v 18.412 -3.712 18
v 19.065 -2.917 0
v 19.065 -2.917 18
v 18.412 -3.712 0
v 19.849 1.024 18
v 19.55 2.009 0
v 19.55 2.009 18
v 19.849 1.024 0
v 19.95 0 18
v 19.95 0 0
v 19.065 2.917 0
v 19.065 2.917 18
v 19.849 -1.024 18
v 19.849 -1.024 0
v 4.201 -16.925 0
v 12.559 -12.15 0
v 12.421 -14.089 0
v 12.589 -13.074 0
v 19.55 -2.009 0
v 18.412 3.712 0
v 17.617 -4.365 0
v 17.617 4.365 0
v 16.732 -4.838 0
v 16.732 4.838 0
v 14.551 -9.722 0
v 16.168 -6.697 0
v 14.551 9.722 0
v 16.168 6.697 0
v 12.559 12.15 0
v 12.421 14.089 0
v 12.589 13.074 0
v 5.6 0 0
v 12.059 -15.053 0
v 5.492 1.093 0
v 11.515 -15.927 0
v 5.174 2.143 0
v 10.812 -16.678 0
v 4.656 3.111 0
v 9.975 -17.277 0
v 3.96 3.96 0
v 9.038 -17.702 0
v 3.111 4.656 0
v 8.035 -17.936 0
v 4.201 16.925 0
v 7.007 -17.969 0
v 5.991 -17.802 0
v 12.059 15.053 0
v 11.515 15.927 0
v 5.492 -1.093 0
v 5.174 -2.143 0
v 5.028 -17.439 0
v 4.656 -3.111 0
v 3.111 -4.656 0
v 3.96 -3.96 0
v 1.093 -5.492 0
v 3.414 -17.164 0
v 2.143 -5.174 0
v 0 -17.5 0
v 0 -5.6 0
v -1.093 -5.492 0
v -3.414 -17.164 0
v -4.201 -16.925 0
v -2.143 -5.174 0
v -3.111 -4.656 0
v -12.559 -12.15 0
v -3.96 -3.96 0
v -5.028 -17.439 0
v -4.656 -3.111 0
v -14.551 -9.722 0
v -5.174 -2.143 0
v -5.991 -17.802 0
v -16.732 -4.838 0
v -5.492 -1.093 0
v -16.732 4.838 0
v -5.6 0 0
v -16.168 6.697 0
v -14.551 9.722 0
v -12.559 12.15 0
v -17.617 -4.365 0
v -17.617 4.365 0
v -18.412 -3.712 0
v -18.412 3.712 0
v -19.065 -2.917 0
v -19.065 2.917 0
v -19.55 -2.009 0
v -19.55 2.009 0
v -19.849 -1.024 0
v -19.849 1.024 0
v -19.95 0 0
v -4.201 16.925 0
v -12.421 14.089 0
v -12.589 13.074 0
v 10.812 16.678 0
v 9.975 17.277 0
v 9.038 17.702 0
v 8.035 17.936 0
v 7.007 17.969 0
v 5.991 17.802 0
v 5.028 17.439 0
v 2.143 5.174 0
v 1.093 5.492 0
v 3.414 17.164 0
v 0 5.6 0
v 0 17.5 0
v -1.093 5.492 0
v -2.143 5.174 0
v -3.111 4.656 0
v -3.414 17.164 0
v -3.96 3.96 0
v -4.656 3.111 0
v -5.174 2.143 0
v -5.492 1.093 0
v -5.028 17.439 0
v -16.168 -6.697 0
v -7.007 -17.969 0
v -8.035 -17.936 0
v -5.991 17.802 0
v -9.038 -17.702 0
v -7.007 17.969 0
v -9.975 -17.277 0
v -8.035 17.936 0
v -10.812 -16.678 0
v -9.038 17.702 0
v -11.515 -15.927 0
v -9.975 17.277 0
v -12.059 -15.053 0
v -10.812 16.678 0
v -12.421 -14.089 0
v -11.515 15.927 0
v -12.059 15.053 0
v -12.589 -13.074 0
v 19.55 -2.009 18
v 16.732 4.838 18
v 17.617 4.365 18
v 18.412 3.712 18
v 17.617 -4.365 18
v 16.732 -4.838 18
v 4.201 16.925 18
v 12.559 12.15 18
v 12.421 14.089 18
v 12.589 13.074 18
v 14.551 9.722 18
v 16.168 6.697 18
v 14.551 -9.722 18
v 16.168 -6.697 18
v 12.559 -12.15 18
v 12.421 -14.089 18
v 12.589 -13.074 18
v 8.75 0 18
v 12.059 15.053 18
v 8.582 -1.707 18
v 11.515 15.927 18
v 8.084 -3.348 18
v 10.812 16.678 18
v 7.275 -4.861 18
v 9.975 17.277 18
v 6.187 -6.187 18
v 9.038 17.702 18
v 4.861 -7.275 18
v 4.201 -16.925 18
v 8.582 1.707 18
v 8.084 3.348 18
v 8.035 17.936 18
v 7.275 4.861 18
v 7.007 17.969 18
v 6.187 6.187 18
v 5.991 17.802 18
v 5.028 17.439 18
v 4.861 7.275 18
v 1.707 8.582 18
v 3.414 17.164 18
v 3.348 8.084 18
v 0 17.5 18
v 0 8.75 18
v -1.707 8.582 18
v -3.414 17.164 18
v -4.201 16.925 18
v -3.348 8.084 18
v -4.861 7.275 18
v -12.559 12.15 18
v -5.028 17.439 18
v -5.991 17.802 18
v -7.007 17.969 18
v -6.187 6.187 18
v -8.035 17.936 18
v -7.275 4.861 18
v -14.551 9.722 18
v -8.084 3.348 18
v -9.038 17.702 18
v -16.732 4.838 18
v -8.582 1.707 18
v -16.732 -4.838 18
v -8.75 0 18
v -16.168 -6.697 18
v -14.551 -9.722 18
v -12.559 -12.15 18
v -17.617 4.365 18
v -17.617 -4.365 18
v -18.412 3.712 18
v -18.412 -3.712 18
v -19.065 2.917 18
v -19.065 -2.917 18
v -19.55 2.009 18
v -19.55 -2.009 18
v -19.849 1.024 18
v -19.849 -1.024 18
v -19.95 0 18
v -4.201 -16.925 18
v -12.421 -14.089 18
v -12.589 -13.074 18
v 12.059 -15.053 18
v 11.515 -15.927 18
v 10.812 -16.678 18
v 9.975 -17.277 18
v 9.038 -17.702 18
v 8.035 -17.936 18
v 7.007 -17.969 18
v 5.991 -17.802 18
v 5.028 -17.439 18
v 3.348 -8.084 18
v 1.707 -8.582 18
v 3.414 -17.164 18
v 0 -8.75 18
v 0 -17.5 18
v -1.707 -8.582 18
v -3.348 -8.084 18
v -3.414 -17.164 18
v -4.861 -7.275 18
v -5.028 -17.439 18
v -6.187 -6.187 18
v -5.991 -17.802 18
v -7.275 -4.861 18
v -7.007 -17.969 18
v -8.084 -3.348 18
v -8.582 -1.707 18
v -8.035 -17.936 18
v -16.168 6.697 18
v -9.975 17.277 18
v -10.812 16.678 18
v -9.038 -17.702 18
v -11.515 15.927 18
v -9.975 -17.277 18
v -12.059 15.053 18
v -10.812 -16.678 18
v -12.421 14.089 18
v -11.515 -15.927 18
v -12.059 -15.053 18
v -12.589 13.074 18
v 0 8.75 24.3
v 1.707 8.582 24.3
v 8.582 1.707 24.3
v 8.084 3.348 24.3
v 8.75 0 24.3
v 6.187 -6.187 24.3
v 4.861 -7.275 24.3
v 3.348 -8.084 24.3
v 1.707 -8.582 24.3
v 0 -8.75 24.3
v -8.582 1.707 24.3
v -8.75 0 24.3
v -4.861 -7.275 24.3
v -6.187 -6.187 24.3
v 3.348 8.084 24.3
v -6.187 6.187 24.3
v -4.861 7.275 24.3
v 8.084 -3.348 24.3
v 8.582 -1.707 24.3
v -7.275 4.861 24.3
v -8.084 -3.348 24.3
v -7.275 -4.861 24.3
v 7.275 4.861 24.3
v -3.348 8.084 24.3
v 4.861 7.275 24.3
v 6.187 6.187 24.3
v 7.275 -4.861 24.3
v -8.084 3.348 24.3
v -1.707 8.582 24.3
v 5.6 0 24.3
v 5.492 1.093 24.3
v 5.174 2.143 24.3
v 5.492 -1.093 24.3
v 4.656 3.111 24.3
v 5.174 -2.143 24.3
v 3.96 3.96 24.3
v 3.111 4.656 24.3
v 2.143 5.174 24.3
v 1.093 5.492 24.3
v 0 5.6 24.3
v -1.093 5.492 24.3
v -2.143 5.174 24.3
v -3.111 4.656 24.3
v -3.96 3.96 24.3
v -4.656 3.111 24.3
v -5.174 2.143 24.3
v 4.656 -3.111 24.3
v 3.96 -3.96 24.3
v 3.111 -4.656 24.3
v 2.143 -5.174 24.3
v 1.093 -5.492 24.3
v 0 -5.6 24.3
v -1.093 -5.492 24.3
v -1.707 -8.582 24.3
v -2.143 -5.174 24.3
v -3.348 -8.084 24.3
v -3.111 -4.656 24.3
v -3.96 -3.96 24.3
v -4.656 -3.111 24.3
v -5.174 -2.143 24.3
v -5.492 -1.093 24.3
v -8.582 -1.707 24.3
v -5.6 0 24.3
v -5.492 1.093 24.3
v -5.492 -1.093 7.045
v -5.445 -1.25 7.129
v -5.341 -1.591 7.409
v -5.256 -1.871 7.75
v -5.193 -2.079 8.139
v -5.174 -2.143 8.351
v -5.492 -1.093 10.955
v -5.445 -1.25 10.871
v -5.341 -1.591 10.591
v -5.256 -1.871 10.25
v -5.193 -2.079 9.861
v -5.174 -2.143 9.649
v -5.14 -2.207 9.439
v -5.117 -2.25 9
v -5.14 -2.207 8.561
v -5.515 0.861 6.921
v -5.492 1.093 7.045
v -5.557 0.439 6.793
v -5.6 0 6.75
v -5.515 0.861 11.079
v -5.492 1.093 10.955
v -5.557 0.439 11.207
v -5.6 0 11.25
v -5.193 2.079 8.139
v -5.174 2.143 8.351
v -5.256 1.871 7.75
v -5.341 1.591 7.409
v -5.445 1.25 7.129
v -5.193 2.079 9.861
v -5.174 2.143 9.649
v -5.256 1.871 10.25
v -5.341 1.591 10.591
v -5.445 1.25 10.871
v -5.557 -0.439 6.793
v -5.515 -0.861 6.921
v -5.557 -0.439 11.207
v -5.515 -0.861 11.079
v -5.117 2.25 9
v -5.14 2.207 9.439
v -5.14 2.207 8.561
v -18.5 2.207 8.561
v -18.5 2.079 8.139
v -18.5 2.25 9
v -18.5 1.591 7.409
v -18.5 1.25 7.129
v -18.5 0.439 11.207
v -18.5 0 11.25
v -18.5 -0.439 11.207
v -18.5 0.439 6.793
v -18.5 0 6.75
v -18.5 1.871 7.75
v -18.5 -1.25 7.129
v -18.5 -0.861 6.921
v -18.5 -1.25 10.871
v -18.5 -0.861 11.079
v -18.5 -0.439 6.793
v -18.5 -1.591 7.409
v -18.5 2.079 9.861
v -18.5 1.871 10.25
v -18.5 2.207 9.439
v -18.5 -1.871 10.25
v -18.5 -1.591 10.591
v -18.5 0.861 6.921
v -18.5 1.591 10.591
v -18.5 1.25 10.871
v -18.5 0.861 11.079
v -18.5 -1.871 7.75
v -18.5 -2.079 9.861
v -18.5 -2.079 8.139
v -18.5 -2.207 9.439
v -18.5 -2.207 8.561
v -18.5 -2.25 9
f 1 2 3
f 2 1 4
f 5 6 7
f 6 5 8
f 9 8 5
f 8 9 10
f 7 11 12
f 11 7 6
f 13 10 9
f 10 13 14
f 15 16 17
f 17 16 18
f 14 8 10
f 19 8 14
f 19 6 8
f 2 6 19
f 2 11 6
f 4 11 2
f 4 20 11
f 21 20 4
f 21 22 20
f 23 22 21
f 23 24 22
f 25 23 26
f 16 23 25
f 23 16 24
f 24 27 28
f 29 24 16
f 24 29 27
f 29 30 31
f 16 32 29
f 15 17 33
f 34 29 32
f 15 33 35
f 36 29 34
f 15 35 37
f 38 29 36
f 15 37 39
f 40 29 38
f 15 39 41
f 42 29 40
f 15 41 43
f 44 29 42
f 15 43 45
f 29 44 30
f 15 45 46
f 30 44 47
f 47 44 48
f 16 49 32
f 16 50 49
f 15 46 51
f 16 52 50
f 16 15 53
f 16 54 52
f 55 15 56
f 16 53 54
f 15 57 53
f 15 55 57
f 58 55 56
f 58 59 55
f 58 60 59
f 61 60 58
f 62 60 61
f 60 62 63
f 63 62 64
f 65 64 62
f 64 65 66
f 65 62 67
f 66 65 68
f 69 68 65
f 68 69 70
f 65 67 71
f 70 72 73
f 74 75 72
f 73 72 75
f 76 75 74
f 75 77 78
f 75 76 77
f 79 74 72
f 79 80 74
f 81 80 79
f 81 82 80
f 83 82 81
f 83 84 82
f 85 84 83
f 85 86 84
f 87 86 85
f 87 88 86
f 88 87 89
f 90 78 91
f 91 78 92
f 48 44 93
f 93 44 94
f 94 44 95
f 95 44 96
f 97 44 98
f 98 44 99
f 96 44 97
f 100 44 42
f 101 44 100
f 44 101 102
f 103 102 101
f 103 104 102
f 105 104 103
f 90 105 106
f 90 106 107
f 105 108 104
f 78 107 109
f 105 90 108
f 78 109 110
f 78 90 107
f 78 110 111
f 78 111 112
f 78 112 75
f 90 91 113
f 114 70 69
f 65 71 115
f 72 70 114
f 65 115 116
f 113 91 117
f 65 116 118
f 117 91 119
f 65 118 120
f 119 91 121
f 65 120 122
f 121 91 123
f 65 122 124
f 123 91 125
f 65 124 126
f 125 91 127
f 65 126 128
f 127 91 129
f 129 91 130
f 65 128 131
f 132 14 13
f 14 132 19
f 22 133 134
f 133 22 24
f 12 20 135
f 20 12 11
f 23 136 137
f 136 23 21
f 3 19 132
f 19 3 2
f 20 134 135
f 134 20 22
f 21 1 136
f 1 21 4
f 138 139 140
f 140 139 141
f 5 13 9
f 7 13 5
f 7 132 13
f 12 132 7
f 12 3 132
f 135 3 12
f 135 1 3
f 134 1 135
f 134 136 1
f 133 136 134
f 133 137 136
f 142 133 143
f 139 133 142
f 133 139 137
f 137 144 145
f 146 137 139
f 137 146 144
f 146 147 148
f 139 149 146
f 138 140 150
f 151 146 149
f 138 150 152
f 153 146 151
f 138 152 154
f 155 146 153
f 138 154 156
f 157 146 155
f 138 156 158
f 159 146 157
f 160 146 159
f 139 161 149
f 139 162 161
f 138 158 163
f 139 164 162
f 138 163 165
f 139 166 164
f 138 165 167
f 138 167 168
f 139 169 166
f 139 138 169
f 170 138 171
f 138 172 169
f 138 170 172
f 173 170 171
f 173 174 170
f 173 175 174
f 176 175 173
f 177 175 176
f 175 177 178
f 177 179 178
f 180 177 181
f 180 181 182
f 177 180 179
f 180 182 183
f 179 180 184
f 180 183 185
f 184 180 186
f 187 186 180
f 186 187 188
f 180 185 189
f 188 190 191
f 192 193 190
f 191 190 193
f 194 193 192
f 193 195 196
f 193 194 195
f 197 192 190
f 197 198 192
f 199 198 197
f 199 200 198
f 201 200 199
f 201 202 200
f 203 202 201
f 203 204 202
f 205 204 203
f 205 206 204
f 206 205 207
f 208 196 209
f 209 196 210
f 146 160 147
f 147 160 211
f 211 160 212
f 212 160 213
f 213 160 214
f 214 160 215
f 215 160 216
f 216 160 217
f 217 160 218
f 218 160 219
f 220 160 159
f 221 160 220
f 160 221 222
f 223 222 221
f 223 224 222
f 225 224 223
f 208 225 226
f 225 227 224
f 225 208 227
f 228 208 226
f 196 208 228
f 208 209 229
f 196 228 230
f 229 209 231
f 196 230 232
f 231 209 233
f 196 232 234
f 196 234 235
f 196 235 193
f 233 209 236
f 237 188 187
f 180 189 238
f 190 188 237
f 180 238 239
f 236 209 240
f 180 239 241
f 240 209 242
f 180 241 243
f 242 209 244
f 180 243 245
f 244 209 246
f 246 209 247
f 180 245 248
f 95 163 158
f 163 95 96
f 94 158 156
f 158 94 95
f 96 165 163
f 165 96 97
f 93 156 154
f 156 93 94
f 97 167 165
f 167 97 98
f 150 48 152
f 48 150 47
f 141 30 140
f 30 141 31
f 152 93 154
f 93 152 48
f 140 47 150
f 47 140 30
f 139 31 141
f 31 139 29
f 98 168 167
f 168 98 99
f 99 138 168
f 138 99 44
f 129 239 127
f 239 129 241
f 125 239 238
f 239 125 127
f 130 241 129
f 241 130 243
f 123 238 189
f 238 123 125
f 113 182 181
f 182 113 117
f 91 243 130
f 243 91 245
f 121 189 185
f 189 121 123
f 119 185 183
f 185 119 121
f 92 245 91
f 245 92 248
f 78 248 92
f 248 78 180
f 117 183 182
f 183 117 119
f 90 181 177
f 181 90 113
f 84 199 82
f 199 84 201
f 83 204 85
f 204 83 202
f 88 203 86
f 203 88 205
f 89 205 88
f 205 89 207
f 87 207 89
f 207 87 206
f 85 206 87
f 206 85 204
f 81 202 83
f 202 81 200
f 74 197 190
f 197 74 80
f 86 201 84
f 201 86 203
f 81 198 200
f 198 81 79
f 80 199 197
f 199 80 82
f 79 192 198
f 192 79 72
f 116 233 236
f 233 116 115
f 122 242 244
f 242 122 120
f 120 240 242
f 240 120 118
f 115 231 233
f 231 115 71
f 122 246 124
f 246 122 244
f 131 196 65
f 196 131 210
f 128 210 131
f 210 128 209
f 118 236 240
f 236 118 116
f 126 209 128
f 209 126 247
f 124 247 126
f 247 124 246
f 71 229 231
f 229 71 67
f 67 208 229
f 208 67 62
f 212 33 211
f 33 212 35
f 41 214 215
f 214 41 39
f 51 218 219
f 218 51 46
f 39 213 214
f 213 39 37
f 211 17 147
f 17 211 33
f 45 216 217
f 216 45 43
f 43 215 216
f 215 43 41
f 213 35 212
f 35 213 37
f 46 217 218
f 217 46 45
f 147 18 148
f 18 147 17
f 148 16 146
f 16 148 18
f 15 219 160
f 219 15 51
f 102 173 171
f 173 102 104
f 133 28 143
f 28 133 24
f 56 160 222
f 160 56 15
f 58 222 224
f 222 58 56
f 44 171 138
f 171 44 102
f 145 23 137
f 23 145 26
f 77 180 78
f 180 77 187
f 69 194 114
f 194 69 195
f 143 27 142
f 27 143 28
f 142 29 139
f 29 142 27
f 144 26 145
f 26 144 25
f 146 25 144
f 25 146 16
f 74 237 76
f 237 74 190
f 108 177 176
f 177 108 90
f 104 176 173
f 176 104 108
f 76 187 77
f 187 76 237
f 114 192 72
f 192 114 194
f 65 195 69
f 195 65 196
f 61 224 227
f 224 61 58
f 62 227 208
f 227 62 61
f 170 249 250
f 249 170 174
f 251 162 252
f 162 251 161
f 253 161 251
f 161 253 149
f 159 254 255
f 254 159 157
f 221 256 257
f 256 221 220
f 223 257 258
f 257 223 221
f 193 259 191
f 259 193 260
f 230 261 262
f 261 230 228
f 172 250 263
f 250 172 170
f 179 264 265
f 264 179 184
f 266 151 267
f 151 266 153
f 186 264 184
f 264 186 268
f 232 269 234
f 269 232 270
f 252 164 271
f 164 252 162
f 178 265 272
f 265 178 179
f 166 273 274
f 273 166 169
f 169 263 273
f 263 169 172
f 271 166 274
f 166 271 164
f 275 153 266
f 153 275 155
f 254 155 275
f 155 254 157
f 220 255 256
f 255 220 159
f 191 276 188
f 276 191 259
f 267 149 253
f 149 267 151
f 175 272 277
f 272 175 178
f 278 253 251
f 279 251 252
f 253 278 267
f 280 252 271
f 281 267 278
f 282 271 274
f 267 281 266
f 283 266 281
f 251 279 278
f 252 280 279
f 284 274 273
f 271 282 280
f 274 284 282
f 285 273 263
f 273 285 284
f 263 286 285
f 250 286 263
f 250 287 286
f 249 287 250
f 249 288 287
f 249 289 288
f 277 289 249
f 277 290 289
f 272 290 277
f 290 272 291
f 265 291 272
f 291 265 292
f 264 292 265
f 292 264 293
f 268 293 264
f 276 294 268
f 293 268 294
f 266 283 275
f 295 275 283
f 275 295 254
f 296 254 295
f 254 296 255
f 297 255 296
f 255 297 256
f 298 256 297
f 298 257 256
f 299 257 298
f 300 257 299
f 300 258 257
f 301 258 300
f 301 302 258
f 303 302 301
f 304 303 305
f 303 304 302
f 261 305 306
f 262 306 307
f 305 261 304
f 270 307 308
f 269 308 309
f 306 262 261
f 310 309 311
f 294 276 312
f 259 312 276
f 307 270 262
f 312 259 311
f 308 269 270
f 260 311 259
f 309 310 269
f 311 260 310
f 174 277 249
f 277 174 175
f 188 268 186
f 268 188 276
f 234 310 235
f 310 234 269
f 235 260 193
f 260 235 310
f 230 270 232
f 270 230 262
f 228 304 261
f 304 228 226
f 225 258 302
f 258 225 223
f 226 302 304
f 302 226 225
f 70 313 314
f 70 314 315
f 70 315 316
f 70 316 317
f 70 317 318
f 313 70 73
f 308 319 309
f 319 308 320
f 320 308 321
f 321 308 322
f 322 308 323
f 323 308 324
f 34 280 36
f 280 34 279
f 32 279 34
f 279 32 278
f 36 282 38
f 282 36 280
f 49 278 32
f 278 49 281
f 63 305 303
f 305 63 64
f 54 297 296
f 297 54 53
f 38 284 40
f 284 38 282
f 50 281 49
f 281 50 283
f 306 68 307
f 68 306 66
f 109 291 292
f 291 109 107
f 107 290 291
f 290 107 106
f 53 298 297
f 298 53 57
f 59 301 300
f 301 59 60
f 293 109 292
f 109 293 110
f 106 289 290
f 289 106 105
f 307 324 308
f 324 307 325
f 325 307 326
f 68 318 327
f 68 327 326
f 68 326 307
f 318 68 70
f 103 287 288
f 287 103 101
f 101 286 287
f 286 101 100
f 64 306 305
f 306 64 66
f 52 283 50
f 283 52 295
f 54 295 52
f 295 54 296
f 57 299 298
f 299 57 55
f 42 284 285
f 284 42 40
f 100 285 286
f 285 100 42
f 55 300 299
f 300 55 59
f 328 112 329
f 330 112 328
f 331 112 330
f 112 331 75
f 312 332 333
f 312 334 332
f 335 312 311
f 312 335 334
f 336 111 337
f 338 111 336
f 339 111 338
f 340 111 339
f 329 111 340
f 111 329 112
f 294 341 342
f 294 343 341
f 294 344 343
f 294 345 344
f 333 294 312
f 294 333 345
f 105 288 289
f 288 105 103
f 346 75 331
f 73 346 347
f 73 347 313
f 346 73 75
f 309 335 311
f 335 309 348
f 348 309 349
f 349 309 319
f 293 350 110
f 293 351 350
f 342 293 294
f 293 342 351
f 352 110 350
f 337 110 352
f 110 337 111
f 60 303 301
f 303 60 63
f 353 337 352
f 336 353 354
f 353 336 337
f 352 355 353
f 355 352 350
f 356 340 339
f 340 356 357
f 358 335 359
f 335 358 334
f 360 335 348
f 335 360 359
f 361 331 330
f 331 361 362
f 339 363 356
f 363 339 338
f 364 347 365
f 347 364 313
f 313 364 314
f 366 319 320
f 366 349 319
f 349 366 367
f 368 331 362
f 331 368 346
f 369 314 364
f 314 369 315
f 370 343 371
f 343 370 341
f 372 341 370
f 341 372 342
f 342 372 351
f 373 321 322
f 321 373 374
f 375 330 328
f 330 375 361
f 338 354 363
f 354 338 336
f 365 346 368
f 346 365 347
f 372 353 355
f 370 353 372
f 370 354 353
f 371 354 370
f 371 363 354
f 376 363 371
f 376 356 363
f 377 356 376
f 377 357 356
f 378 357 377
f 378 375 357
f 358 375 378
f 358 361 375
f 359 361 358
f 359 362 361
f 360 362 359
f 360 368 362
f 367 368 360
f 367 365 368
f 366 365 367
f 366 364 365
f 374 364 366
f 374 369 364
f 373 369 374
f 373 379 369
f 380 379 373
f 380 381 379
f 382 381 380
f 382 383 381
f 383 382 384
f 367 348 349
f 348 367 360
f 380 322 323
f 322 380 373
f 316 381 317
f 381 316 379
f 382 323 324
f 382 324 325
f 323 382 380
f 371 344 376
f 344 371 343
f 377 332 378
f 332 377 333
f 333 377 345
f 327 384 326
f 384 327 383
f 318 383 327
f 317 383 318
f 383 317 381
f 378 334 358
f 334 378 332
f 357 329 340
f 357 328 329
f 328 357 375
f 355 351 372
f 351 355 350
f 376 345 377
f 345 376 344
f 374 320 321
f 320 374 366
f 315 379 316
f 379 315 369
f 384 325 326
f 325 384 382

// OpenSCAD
$fn = 32;

// ----------------------------------------------------------------------
// Hand knob: 35 x 35 x 24.3 mm
// ----------------------------------------------------------------------

// --- parameters (mm) ---
head_d = 35;              // knob diameter
head_h = 18;              // knob height
hole_d = 11.2;            // shaft bore
set_d = 4.5;              // set screw tap hole
notch_d = 1.16;           // knurl groove diameter
lobes = 6;                // grip lobes
cap_h = 6.3;              // raised centre cap
cap_d = 17.5;             // centre cap diameter

module body() {
  cylinder(h = head_h, d = head_d);
  for (i = [0 : lobes - 1])
    rotate([0, 0, i * 360 / lobes])
      translate([head_d * 0.42, 0, 0])
        cylinder(h = head_h, d = head_d * 0.3);
}

module cap() {
  translate([0, 0, head_h - 1]) cylinder(h = cap_h + 1, d = cap_d);
}

difference() {
  union() {
    body();
    cap();
  }
  translate([0, 0, -1]) cylinder(h = head_h + cap_h + 2, d = hole_d);
  translate([-head_d / 2 - 1, 0, head_h * 0.5]) rotate([0, 90, 0]) cylinder(h = head_d / 2 + 2, d = set_d);
}
